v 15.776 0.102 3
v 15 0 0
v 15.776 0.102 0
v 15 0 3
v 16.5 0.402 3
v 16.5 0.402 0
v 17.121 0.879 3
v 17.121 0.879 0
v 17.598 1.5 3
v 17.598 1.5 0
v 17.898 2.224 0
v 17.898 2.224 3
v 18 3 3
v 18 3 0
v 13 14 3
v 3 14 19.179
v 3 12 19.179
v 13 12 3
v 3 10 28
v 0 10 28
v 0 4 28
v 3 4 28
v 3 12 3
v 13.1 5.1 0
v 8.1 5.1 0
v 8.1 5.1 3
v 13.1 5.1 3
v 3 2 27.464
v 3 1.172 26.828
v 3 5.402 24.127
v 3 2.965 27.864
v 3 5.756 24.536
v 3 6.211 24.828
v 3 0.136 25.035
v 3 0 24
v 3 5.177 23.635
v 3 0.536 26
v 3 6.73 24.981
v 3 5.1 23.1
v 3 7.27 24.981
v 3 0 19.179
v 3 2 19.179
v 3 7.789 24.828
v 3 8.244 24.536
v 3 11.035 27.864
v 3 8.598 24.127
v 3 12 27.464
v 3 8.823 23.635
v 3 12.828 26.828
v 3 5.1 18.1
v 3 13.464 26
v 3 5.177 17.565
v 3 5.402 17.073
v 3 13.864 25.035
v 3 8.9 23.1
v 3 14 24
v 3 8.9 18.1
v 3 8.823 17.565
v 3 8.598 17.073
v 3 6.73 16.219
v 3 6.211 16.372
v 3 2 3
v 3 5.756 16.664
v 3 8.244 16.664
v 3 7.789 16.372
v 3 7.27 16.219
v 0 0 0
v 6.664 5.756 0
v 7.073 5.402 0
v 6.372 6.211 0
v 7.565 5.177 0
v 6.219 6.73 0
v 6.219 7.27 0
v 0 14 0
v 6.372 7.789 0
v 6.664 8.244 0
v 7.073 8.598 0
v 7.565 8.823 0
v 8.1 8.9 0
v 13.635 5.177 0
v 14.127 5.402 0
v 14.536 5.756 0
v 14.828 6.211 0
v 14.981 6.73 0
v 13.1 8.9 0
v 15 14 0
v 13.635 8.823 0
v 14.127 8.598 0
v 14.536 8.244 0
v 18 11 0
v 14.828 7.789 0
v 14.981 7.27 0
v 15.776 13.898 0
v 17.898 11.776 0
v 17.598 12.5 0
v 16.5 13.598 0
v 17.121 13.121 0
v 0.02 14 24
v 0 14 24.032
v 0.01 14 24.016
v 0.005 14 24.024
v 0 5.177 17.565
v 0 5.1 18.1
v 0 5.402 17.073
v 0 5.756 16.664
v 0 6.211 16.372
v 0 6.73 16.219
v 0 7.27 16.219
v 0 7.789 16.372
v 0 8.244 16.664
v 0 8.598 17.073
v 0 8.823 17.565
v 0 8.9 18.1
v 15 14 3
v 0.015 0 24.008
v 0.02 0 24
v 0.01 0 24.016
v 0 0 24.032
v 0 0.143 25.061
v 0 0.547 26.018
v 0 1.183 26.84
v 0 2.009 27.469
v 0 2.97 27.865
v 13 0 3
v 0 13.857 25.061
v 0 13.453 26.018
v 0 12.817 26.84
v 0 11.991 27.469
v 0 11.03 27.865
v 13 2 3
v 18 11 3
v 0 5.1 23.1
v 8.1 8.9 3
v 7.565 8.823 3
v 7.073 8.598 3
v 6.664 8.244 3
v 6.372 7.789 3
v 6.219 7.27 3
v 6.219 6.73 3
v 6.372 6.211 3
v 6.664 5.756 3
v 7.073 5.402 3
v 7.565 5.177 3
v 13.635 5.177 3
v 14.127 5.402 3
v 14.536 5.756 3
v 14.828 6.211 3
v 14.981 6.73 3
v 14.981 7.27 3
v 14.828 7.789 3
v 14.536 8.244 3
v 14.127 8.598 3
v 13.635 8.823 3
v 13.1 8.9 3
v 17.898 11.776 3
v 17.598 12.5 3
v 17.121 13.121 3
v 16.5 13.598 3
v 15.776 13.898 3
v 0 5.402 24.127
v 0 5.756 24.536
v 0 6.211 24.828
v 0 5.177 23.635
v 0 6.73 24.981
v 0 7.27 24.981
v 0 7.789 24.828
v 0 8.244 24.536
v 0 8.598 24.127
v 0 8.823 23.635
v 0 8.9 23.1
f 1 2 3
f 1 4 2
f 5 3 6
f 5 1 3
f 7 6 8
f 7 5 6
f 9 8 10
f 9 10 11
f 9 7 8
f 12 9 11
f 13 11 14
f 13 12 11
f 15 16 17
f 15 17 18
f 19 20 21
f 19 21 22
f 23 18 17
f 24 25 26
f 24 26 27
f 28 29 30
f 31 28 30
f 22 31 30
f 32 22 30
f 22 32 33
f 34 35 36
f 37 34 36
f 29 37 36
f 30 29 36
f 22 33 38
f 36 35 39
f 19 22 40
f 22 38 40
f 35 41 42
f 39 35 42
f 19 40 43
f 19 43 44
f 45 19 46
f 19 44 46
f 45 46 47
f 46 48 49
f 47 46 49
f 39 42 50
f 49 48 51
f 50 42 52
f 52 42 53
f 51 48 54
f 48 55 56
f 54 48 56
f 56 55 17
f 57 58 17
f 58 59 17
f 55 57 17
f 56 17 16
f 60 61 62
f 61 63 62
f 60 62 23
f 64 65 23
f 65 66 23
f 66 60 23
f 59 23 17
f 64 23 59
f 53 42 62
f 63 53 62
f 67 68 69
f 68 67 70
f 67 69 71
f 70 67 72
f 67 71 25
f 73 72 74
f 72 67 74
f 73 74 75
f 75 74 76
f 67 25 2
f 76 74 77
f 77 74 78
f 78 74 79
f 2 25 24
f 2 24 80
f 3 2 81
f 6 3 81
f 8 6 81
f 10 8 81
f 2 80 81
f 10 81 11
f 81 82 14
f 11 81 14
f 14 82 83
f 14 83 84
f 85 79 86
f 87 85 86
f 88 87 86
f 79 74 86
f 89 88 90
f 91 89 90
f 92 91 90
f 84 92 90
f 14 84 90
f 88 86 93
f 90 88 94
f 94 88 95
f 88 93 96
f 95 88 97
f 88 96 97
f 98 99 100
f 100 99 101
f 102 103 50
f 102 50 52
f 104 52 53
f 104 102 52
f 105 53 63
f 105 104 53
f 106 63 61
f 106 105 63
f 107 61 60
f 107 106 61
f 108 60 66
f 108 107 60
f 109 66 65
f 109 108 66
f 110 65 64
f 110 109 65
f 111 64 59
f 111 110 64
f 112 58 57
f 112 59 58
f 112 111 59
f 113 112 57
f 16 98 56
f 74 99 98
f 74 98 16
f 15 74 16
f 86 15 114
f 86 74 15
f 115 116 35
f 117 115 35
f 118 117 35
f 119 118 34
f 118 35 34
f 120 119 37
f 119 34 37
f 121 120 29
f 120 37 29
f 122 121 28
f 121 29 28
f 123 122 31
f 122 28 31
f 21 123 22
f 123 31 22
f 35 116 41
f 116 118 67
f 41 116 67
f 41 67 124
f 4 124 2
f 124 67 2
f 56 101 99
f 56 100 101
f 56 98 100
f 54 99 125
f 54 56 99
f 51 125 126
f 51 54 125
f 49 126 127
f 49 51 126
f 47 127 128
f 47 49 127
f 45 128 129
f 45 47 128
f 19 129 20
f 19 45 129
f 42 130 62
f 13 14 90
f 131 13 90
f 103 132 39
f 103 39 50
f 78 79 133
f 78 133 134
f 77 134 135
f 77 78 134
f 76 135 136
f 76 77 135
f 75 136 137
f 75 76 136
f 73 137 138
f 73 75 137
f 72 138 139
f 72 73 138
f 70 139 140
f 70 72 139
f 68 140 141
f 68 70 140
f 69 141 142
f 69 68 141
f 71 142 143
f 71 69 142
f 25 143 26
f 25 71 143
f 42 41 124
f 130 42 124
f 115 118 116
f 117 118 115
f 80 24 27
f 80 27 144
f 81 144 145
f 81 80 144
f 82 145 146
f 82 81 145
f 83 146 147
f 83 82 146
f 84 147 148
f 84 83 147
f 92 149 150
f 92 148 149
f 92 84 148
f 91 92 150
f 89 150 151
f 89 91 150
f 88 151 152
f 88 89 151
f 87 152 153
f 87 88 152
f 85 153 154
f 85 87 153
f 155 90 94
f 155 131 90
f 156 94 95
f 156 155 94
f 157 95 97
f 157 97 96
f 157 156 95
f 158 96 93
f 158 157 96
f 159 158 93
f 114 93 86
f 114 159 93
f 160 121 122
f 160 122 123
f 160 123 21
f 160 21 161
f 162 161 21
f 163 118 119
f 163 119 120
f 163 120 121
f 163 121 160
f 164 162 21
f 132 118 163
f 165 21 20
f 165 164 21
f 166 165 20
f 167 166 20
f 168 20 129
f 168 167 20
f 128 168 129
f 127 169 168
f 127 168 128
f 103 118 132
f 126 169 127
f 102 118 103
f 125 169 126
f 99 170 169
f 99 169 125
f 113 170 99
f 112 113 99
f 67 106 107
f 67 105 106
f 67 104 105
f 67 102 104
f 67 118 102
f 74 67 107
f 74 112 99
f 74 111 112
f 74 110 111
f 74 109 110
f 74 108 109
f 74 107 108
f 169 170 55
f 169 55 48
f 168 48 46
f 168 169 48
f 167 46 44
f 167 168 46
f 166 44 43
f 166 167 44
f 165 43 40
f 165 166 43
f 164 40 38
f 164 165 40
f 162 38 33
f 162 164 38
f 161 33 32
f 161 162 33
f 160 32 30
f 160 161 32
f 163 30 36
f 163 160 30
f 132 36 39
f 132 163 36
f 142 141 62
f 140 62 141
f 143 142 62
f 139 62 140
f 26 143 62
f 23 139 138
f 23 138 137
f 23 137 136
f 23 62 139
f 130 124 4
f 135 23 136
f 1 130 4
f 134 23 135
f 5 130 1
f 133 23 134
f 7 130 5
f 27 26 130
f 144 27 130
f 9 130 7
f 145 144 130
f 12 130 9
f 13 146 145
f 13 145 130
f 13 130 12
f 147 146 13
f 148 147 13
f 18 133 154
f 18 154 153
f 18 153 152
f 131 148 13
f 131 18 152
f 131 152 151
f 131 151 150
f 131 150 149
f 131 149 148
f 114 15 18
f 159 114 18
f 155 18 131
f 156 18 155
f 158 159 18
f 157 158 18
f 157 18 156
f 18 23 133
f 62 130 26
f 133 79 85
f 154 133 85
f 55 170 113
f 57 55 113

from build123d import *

# Parameters (mm, degrees)
BOX002_W                = 5
BOX002_H                = 3.8
BOX002_DEPTH            = 10
CYLINDER_R              = 1.9
CYLINDER_DEPTH          = 10
ARRAY_X_COUNT           = 2
ARRAY_X_PITCH           = 5
BODY002_PLACEMENT_ANGLE = 90
BOX001_W                = 3
BOX001_H                = 14
BOX001_DEPTH            = 28
FILLET001_R             = 4
PAD_DEPTH               = 2
BOX_W                   = 18
BOX_H                   = 14
BOX_DEPTH               = 3
FILLET_R                = 3


with BuildPart() as between_hole_cube:
    # Box002 → Box002 (new body)
    with BuildSketch(Plane(origin=(0, -1.9, 0), x_dir=(1, 0, 0), z_dir=(0, 0, 1))):
        with Locations((2.5, 1.9)):
            Rectangle(BOX002_W, BOX002_H)
    extrude(amount=BOX002_DEPTH)


with BuildPart() as screw_hole_fusion:
    # Cylinder → Cylinder (new body)
    with BuildSketch(Plane.XY):
        Circle(CYLINDER_R)
    extrude(amount=CYLINDER_DEPTH)

    # Array X: screw hole fusion ×2


with BuildPart() as screw_hole_fusion_1:
    add(screw_hole_fusion.part)
    with Locations(*[(i * ARRAY_X_PITCH, 0, 0) for i in range(1, ARRAY_X_COUNT)]):
        add(screw_hole_fusion.part)

    # Fusion002: union between hole cube
    add(between_hole_cube.part)


with BuildPart() as h_screw_hole_fusion_clone:
    # Body002 base: copy of screw hole fusion
    add(screw_hole_fusion_1.part)


with BuildPart() as h_screw_hole_fusion_clone_1:
    # Body002 placement: moved
    add(h_screw_hole_fusion_clone.part.moved(Location((0, 7, 23.1))).rotate(Axis((0, 7, 23.1), (0, 1, 0)), BODY002_PLACEMENT_ANGLE))


with BuildPart() as hole_fusion:
    # Body001 base: copy of screw hole fusion
    add(screw_hole_fusion_1.part)


with BuildPart() as hole_fusion_1:
    # Body001 placement: moved
    add(hole_fusion.part.moved(Location((8.1, 7, 0))))

    # Fusion001: union h screw hole fusion clone
    add(h_screw_hole_fusion_clone_1.part)


with BuildPart() as bottom_cube_fillet:
    # Box001 → Box001 (new body)
    with BuildSketch(Plane.XY):
        with Locations((1.5, 7)):
            Rectangle(BOX001_W, BOX001_H)
    extrude(amount=BOX001_DEPTH)

    # Fillet001
    fillet001_edges = [bottom_cube_fillet.edges().sort_by_distance(p)[0] for p in [
        (1.5, 0, 28),
        (1.5, 14, 28),
    ]]
    fillet(fillet001_edges, radius=FILLET001_R)


with BuildPart() as triangle_body:
    # Sketch → Pad (new body)
    with BuildSketch(Plane.XZ):
        Polygon((0, 0), (0, 24.03203), (14.854653, 0), align=None)
    extrude(amount=-PAD_DEPTH)


with BuildPart() as part_mirroring:
    # Part__Mirroring: instance of triangle body
    add(triangle_body.part.mirror(Plane(origin=(0, 7, 0), x_dir=(1, 0, 0), z_dir=(0, 1, 0))))


with BuildPart() as bracket_cut:
    # Box → Box (new body)
    with BuildSketch(Plane.XY):
        with Locations((9, 7)):
            Rectangle(BOX_W, BOX_H)
    extrude(amount=BOX_DEPTH)

    # Fillet
    fillet_edges = [bracket_cut.edges().sort_by_distance(p)[0] for p in [
        (18, 0, 1.5),
        (18, 14, 1.5),
    ]]
    fillet(fillet_edges, radius=FILLET_R)

    # Fusion: union bottom cube fillet, Part__Mirroring, triangle body
    add(bottom_cube_fillet.part)
    add(part_mirroring.part)
    add(triangle_body.part)

    # Cut: cut hole fusion
    add(hole_fusion_1.part, mode=Mode.SUBTRACT)


solid = bracket_cut.part
